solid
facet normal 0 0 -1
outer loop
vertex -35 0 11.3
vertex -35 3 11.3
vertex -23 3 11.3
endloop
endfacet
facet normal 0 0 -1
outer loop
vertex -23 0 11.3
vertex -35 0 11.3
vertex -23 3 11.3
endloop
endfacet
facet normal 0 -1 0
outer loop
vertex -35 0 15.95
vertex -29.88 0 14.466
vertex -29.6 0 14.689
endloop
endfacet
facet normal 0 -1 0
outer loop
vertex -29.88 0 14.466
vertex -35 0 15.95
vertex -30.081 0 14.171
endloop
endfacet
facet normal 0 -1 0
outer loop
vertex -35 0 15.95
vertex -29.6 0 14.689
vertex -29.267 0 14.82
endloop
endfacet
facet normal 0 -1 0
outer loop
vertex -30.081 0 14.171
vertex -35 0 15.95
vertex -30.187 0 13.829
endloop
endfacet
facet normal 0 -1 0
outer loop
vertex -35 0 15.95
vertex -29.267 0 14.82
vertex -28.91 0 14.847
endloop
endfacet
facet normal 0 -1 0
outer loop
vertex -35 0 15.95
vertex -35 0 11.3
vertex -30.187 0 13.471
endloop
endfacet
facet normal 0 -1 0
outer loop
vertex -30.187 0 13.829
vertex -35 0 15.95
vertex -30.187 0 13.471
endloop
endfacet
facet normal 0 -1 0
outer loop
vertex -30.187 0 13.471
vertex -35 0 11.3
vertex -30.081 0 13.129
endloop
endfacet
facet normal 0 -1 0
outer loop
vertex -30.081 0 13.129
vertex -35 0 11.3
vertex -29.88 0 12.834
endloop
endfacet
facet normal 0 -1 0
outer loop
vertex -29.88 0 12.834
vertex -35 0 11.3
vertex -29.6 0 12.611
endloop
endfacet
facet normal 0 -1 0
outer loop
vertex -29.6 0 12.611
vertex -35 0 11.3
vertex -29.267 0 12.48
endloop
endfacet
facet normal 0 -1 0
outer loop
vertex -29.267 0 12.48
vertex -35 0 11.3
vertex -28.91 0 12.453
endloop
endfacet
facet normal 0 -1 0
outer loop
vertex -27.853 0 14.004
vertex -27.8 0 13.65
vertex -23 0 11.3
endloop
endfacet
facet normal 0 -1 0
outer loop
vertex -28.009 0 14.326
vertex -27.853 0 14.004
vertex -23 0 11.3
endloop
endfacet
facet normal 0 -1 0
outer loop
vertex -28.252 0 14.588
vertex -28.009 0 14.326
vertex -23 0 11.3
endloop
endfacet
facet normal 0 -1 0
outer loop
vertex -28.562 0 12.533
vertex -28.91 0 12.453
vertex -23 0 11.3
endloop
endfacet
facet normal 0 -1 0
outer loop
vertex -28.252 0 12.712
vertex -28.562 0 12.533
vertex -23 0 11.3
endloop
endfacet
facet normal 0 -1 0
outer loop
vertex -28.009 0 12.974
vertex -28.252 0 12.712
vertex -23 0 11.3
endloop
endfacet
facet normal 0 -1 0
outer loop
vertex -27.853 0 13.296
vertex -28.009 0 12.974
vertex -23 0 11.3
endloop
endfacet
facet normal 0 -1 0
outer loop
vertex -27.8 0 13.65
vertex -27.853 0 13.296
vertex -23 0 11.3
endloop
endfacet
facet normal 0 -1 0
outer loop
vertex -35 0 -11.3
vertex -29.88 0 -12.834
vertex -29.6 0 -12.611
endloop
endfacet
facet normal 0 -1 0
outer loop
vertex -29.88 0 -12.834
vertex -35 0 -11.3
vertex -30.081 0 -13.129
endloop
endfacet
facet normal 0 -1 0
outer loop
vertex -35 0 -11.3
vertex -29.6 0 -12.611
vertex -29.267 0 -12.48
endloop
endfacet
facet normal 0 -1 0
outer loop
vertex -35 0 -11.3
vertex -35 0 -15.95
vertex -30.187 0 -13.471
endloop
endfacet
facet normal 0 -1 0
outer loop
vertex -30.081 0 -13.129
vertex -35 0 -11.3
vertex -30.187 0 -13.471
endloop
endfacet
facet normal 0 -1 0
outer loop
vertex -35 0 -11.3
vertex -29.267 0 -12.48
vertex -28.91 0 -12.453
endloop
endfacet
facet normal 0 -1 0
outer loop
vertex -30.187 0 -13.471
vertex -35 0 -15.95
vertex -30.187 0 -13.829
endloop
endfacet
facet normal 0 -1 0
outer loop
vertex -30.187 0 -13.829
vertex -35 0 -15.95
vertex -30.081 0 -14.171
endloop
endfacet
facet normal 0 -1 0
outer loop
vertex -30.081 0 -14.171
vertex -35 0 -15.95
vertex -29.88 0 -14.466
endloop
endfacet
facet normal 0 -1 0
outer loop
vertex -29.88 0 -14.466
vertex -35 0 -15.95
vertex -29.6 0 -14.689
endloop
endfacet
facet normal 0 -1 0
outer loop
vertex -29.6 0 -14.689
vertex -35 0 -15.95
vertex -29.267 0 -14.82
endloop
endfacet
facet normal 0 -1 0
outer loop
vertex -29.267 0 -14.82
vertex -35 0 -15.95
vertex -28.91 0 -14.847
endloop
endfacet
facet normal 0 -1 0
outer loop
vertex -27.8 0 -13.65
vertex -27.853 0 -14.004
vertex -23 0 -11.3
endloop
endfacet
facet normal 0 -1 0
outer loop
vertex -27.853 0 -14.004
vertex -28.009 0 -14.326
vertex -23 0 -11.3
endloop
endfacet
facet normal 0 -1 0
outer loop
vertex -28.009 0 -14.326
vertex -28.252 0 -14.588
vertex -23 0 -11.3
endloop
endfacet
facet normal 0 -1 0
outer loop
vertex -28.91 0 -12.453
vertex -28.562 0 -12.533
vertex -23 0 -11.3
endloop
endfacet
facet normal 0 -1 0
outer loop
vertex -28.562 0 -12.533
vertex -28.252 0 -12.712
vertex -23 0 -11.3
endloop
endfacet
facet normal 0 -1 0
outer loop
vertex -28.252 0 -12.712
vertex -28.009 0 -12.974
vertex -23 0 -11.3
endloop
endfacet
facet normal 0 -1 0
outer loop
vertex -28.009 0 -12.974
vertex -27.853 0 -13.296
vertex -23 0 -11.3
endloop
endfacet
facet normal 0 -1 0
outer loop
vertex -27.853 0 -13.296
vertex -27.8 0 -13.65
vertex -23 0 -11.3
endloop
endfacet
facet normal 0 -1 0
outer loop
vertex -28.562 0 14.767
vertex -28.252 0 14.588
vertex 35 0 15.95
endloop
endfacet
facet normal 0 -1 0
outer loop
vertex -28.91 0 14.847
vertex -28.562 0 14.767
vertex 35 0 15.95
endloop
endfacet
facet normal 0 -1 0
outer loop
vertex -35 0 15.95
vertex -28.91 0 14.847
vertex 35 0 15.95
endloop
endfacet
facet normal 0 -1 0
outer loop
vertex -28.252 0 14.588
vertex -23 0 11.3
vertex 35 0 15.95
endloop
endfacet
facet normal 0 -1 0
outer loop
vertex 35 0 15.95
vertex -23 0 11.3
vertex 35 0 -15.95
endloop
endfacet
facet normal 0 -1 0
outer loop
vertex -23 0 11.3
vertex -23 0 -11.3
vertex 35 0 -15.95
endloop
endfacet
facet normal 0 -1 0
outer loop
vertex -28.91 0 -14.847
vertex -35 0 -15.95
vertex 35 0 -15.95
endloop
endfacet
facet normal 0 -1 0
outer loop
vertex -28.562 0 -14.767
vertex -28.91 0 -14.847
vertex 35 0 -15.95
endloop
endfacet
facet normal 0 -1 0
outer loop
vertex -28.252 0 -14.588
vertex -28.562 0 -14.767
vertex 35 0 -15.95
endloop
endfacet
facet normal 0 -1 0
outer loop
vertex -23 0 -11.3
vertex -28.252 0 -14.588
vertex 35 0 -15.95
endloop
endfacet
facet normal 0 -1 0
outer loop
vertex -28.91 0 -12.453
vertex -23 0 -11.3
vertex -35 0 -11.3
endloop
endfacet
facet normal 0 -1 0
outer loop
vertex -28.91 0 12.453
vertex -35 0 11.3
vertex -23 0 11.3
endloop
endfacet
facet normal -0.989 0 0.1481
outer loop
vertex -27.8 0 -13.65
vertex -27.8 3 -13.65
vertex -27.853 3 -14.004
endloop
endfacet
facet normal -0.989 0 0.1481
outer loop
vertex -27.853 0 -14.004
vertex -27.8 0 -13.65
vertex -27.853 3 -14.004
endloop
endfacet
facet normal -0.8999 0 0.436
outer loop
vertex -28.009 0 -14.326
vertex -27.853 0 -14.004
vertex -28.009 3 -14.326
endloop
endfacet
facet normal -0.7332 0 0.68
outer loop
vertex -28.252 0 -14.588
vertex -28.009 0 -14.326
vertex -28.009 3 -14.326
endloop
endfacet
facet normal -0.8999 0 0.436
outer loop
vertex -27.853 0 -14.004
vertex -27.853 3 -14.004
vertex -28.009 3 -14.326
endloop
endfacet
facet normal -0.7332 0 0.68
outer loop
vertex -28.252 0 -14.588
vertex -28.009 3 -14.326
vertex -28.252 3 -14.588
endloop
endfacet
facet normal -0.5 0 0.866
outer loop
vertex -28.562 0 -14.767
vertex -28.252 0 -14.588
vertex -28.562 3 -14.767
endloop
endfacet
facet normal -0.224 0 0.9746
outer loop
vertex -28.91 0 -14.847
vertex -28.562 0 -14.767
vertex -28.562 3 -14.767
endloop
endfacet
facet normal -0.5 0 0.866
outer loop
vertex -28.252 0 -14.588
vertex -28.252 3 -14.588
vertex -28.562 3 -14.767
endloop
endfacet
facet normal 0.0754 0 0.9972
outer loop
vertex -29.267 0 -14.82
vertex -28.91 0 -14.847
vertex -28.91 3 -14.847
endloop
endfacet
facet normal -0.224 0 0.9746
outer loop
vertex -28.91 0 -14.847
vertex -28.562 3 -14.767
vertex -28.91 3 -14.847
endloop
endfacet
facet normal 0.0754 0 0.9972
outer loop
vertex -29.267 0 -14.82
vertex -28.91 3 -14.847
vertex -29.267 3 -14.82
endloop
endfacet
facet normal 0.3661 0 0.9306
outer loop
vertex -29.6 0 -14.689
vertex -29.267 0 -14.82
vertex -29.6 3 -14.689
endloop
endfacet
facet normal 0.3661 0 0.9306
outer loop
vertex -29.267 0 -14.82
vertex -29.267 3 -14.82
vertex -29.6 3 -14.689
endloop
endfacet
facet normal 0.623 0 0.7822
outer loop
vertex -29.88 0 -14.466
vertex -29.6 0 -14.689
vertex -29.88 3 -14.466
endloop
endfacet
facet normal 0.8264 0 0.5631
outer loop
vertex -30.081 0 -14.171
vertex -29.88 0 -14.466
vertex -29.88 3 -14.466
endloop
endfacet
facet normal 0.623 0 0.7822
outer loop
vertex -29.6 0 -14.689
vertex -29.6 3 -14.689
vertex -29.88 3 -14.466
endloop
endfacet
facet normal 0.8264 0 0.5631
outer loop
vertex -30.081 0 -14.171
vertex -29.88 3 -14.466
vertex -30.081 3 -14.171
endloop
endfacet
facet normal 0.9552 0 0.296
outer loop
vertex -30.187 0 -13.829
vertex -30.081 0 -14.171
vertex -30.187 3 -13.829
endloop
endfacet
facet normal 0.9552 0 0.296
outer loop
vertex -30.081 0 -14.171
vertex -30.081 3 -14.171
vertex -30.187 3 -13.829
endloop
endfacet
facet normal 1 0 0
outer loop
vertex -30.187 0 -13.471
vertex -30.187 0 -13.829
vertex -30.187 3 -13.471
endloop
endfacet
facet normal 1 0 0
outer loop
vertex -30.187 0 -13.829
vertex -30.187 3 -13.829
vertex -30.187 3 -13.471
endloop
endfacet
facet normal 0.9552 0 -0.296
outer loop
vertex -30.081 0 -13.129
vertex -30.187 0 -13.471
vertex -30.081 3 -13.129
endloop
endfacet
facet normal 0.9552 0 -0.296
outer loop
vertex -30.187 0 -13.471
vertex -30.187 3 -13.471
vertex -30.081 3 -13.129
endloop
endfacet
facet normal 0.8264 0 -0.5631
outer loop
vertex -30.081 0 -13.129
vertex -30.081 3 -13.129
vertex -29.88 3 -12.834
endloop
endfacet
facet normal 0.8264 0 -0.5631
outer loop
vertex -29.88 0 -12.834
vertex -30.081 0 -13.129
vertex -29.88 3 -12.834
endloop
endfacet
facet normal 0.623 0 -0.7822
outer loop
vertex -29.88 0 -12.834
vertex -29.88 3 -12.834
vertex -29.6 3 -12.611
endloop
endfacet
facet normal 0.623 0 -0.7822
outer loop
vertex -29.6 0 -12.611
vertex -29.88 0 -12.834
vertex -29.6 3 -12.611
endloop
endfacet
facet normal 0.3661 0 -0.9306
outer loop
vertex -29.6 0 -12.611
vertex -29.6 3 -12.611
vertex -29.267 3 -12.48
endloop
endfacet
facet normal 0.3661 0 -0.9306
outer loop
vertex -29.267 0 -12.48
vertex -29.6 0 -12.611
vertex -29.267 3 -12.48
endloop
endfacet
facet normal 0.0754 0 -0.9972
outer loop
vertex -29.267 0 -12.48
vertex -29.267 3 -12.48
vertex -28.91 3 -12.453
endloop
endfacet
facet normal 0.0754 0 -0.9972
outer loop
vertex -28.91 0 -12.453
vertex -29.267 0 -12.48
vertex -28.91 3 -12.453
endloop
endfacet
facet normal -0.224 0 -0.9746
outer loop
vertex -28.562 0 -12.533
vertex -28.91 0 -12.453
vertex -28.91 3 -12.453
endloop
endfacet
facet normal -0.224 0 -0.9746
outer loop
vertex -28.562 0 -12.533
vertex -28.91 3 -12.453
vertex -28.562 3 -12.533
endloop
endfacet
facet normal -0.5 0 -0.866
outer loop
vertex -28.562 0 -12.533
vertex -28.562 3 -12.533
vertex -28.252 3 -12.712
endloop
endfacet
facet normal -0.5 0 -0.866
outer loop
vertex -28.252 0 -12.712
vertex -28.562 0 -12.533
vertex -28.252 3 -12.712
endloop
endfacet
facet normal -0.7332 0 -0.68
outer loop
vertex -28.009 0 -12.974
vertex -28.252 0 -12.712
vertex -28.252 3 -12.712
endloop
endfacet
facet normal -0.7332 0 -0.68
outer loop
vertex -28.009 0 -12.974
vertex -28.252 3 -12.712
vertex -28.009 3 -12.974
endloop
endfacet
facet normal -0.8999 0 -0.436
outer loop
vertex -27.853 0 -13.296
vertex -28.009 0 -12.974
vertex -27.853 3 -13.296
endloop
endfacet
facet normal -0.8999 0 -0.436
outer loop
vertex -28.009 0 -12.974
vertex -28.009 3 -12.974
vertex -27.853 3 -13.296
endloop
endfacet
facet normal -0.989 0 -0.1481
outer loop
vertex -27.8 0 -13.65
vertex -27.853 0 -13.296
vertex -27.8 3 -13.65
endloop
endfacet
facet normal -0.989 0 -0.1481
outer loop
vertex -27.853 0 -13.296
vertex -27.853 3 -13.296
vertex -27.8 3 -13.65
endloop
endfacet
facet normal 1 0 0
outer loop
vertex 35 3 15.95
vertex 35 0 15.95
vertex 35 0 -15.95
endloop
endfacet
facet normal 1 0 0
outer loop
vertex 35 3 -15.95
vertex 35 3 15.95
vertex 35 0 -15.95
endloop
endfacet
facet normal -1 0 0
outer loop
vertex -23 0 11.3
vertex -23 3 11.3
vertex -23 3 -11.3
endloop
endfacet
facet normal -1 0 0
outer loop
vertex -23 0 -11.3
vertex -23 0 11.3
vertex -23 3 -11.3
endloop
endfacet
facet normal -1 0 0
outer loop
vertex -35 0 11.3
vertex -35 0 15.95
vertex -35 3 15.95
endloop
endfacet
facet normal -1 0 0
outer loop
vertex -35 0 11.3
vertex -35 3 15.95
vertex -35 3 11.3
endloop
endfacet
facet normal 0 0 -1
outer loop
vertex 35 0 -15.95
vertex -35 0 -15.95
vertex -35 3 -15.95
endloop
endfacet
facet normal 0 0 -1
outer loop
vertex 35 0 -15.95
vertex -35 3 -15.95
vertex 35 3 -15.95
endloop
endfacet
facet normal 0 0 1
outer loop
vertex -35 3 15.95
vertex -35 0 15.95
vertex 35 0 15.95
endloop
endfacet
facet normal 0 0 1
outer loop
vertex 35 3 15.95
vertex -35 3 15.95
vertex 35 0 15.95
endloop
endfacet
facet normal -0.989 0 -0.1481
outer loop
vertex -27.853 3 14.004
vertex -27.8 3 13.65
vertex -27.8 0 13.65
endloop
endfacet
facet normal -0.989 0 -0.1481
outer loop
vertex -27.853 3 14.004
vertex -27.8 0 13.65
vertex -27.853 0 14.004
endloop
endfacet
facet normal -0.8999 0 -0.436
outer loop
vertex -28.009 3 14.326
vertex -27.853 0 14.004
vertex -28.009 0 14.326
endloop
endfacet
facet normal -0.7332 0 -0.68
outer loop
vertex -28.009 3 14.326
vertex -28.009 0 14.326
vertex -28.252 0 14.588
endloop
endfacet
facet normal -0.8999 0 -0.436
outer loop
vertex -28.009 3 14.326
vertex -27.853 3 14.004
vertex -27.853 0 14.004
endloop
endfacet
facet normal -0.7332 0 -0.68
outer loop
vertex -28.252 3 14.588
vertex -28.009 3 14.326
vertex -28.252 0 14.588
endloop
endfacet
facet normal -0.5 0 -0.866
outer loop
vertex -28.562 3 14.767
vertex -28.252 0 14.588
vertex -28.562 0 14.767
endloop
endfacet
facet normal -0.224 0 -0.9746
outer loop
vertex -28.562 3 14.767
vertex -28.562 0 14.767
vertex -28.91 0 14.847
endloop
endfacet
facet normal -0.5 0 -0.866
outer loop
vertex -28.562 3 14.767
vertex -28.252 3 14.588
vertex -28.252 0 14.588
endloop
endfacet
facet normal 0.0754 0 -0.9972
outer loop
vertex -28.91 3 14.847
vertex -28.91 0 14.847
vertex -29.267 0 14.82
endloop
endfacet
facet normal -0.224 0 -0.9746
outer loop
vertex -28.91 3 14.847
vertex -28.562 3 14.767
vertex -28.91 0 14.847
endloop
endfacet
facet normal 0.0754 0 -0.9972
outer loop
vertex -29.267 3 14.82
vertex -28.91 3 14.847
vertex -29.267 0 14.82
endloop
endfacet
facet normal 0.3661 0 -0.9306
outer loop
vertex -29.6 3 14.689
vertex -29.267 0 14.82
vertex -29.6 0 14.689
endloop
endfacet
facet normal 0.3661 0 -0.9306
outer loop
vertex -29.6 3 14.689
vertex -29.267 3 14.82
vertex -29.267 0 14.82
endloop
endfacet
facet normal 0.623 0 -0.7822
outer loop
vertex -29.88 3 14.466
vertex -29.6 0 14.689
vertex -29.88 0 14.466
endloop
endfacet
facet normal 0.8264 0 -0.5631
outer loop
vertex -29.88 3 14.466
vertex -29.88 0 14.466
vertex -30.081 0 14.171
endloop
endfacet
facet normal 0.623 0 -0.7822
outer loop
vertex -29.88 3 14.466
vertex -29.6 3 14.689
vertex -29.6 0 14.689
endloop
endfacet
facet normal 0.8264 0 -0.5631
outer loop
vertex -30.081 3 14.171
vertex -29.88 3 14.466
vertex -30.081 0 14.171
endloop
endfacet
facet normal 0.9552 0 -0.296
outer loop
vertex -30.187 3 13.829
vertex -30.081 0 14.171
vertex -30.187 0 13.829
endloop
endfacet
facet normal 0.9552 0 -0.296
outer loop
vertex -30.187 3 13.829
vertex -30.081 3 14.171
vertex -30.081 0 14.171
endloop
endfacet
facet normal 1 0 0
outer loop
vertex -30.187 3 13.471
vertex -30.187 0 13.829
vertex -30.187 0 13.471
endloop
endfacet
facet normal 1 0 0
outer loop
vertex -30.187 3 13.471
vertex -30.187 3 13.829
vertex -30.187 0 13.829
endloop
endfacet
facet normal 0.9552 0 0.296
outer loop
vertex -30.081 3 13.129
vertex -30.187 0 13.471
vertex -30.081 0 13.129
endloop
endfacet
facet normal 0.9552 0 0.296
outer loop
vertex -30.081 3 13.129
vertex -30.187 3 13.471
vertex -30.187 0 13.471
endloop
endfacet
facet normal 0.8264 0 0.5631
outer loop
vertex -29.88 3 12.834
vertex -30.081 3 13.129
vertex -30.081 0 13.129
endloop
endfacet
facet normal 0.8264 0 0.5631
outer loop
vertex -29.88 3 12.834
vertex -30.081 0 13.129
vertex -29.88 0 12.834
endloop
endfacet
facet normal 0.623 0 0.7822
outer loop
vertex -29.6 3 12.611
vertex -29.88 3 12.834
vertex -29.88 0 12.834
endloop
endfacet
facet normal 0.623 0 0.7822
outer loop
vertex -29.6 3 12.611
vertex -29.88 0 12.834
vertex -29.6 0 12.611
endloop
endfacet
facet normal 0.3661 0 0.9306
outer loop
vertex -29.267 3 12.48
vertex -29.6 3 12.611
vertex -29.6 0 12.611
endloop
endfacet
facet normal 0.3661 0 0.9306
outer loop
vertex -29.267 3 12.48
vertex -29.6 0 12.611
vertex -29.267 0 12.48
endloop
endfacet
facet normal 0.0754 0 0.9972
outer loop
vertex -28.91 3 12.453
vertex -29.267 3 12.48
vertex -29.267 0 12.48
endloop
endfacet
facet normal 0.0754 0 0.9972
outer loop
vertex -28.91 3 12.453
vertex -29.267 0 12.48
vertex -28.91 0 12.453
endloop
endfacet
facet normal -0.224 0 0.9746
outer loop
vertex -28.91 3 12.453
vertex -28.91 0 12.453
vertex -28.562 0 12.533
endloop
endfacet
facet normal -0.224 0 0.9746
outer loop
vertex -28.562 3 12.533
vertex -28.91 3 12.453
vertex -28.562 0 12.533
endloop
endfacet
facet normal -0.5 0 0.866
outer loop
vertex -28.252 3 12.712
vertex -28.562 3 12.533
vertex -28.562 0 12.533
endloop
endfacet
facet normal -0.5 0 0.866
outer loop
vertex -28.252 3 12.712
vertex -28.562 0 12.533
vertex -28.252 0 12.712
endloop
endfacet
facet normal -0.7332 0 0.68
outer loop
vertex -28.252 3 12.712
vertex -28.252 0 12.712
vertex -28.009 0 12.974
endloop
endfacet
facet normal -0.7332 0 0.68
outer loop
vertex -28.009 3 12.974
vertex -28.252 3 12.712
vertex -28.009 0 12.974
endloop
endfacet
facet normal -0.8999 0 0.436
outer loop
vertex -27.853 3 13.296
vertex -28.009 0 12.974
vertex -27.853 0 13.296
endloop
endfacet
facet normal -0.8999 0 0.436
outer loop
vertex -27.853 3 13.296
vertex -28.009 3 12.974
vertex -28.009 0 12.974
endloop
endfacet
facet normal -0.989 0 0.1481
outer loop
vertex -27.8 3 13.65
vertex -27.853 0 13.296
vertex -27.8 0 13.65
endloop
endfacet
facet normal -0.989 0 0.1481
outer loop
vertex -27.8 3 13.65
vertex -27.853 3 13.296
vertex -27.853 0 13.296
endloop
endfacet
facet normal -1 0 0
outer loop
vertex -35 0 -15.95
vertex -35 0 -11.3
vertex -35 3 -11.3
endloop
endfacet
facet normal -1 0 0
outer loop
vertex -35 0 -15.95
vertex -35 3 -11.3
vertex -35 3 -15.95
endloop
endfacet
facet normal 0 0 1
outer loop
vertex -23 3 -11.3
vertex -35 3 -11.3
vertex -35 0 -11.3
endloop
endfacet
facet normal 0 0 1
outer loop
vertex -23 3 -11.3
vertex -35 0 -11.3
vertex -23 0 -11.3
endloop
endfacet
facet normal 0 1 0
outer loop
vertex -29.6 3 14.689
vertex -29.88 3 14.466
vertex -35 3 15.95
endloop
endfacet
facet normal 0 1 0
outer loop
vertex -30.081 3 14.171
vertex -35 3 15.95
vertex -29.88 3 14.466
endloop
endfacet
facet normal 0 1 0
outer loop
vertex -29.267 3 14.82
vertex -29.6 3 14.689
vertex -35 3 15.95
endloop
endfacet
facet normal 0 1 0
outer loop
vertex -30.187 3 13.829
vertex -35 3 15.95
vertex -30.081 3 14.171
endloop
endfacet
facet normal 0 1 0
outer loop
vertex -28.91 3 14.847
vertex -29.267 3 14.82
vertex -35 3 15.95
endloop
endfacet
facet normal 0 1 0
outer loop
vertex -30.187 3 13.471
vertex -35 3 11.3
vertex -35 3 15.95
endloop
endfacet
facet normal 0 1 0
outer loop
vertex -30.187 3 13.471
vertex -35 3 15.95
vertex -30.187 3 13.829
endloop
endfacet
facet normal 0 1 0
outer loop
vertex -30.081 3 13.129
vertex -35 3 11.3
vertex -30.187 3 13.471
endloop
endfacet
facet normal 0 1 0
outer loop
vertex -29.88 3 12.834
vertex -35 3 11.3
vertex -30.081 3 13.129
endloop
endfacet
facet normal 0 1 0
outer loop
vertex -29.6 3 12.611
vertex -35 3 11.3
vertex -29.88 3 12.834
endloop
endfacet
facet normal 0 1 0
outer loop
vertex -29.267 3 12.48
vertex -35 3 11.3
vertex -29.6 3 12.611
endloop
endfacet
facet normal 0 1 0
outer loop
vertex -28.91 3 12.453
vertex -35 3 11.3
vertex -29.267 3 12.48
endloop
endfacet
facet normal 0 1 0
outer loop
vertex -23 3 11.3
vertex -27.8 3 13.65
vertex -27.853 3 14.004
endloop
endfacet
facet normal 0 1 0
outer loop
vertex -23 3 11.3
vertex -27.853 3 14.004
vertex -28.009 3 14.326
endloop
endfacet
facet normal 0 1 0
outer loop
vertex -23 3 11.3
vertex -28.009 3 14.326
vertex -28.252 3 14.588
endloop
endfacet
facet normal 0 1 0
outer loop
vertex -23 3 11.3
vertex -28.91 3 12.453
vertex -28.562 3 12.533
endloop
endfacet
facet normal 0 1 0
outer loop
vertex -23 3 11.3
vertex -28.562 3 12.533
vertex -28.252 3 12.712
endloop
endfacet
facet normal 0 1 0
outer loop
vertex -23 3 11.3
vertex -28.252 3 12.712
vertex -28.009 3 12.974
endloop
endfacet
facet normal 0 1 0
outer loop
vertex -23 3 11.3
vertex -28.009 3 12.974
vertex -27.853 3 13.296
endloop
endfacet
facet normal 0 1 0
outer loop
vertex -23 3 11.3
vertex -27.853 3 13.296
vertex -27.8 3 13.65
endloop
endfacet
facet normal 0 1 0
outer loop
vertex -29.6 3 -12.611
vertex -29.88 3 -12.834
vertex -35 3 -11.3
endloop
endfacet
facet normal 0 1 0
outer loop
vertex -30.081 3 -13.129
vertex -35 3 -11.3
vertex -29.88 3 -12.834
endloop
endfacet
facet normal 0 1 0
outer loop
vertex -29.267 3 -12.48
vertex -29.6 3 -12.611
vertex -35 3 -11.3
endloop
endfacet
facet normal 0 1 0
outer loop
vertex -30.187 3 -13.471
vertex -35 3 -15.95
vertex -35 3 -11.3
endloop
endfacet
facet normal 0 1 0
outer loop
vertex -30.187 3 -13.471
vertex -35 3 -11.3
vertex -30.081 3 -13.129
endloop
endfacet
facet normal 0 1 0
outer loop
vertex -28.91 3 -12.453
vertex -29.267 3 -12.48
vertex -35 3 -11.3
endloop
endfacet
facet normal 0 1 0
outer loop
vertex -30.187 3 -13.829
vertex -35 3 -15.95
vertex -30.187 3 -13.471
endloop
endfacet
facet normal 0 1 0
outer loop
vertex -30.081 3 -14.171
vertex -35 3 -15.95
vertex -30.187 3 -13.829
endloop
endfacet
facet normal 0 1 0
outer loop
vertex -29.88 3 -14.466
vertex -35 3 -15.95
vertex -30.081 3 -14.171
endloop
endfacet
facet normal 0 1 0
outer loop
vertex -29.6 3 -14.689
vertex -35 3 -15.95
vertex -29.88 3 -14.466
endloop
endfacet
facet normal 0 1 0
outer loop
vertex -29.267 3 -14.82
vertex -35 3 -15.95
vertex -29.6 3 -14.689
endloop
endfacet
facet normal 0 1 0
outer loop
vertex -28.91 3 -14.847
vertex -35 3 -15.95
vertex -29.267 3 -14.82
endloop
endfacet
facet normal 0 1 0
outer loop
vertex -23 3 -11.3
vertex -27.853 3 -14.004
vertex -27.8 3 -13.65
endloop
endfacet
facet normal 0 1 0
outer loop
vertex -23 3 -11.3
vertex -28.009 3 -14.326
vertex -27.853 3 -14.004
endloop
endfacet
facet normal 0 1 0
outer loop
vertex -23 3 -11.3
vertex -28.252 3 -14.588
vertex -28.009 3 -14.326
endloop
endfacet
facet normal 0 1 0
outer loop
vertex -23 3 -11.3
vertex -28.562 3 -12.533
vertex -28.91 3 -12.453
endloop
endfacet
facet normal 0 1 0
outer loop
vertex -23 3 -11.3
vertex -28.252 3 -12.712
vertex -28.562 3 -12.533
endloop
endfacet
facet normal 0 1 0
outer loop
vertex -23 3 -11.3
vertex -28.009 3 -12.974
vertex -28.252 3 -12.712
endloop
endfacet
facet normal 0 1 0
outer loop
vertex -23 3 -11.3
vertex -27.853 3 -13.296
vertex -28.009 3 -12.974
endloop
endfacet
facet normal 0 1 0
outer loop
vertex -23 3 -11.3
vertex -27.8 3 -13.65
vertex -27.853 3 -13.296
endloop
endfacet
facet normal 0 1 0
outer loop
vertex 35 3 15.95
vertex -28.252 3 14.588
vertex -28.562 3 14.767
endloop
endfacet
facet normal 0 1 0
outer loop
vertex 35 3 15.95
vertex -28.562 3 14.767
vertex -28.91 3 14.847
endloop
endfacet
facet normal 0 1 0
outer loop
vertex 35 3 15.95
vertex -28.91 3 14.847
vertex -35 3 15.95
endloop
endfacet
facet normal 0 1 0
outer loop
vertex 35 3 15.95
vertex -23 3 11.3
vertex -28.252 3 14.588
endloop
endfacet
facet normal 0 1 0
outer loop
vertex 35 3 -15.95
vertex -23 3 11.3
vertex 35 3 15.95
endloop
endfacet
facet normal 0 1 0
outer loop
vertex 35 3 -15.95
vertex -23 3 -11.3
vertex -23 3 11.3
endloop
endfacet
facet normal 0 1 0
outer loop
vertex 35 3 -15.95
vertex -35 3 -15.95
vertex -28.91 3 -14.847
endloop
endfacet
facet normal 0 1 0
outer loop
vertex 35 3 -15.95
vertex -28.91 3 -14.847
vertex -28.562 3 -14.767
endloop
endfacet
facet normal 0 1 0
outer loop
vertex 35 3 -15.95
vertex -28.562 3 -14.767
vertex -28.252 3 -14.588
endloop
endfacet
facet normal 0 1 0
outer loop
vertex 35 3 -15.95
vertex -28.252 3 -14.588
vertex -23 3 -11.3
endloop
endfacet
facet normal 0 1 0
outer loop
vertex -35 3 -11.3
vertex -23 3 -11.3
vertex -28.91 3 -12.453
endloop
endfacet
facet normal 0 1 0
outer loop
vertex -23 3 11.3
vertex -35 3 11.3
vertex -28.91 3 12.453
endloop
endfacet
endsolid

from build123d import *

# Parameters (mm, degrees)
SKETCH1_W           = 70
SKETCH1_H           = 31.9
BOSS_EXTRUDE1_DEPTH = 3
SKETCH2_R           = 1.2
CUT_EXTRUDE1_DEPTH  = 3
SKETCH3_W           = 24
SKETCH3_H           = 22.6
CUT_EXTRUDE2_DEPTH  = 3


with BuildPart() as part:
    # Sketch1 → Boss-Extrude1 (new body)
    with BuildSketch(Plane(origin=(0, 0, 0), x_dir=(1, 0, 0), z_dir=(0, 1, 0))):
        Rectangle(SKETCH1_W, SKETCH1_H)
    extrude(amount=BOSS_EXTRUDE1_DEPTH)

    # Sketch2 → Cut-Extrude1 (cut)
    with BuildSketch(Plane(origin=(0, 3, 0), x_dir=(1, 0, 0), z_dir=(0, 1, 0))):
        with Locations((-29, 13.65)):
            Circle(SKETCH2_R)
    cut_extrude1 = extrude(amount=-CUT_EXTRUDE1_DEPTH, mode=Mode.SUBTRACT)

    # Mirror1: Cut-Extrude1 across plane
    add(cut_extrude1.mirror(Plane.XY), mode=Mode.SUBTRACT)

    # Sketch3 → Cut-Extrude2 (cut)
    with BuildSketch(Plane(origin=(0, 3, 0), x_dir=(1, 0, 0), z_dir=(0, 1, 0))):
        with Locations((-35, 0)):
            Rectangle(SKETCH3_W, SKETCH3_H)
    extrude(amount=-CUT_EXTRUDE2_DEPTH, mode=Mode.SUBTRACT)


solid = part.part
